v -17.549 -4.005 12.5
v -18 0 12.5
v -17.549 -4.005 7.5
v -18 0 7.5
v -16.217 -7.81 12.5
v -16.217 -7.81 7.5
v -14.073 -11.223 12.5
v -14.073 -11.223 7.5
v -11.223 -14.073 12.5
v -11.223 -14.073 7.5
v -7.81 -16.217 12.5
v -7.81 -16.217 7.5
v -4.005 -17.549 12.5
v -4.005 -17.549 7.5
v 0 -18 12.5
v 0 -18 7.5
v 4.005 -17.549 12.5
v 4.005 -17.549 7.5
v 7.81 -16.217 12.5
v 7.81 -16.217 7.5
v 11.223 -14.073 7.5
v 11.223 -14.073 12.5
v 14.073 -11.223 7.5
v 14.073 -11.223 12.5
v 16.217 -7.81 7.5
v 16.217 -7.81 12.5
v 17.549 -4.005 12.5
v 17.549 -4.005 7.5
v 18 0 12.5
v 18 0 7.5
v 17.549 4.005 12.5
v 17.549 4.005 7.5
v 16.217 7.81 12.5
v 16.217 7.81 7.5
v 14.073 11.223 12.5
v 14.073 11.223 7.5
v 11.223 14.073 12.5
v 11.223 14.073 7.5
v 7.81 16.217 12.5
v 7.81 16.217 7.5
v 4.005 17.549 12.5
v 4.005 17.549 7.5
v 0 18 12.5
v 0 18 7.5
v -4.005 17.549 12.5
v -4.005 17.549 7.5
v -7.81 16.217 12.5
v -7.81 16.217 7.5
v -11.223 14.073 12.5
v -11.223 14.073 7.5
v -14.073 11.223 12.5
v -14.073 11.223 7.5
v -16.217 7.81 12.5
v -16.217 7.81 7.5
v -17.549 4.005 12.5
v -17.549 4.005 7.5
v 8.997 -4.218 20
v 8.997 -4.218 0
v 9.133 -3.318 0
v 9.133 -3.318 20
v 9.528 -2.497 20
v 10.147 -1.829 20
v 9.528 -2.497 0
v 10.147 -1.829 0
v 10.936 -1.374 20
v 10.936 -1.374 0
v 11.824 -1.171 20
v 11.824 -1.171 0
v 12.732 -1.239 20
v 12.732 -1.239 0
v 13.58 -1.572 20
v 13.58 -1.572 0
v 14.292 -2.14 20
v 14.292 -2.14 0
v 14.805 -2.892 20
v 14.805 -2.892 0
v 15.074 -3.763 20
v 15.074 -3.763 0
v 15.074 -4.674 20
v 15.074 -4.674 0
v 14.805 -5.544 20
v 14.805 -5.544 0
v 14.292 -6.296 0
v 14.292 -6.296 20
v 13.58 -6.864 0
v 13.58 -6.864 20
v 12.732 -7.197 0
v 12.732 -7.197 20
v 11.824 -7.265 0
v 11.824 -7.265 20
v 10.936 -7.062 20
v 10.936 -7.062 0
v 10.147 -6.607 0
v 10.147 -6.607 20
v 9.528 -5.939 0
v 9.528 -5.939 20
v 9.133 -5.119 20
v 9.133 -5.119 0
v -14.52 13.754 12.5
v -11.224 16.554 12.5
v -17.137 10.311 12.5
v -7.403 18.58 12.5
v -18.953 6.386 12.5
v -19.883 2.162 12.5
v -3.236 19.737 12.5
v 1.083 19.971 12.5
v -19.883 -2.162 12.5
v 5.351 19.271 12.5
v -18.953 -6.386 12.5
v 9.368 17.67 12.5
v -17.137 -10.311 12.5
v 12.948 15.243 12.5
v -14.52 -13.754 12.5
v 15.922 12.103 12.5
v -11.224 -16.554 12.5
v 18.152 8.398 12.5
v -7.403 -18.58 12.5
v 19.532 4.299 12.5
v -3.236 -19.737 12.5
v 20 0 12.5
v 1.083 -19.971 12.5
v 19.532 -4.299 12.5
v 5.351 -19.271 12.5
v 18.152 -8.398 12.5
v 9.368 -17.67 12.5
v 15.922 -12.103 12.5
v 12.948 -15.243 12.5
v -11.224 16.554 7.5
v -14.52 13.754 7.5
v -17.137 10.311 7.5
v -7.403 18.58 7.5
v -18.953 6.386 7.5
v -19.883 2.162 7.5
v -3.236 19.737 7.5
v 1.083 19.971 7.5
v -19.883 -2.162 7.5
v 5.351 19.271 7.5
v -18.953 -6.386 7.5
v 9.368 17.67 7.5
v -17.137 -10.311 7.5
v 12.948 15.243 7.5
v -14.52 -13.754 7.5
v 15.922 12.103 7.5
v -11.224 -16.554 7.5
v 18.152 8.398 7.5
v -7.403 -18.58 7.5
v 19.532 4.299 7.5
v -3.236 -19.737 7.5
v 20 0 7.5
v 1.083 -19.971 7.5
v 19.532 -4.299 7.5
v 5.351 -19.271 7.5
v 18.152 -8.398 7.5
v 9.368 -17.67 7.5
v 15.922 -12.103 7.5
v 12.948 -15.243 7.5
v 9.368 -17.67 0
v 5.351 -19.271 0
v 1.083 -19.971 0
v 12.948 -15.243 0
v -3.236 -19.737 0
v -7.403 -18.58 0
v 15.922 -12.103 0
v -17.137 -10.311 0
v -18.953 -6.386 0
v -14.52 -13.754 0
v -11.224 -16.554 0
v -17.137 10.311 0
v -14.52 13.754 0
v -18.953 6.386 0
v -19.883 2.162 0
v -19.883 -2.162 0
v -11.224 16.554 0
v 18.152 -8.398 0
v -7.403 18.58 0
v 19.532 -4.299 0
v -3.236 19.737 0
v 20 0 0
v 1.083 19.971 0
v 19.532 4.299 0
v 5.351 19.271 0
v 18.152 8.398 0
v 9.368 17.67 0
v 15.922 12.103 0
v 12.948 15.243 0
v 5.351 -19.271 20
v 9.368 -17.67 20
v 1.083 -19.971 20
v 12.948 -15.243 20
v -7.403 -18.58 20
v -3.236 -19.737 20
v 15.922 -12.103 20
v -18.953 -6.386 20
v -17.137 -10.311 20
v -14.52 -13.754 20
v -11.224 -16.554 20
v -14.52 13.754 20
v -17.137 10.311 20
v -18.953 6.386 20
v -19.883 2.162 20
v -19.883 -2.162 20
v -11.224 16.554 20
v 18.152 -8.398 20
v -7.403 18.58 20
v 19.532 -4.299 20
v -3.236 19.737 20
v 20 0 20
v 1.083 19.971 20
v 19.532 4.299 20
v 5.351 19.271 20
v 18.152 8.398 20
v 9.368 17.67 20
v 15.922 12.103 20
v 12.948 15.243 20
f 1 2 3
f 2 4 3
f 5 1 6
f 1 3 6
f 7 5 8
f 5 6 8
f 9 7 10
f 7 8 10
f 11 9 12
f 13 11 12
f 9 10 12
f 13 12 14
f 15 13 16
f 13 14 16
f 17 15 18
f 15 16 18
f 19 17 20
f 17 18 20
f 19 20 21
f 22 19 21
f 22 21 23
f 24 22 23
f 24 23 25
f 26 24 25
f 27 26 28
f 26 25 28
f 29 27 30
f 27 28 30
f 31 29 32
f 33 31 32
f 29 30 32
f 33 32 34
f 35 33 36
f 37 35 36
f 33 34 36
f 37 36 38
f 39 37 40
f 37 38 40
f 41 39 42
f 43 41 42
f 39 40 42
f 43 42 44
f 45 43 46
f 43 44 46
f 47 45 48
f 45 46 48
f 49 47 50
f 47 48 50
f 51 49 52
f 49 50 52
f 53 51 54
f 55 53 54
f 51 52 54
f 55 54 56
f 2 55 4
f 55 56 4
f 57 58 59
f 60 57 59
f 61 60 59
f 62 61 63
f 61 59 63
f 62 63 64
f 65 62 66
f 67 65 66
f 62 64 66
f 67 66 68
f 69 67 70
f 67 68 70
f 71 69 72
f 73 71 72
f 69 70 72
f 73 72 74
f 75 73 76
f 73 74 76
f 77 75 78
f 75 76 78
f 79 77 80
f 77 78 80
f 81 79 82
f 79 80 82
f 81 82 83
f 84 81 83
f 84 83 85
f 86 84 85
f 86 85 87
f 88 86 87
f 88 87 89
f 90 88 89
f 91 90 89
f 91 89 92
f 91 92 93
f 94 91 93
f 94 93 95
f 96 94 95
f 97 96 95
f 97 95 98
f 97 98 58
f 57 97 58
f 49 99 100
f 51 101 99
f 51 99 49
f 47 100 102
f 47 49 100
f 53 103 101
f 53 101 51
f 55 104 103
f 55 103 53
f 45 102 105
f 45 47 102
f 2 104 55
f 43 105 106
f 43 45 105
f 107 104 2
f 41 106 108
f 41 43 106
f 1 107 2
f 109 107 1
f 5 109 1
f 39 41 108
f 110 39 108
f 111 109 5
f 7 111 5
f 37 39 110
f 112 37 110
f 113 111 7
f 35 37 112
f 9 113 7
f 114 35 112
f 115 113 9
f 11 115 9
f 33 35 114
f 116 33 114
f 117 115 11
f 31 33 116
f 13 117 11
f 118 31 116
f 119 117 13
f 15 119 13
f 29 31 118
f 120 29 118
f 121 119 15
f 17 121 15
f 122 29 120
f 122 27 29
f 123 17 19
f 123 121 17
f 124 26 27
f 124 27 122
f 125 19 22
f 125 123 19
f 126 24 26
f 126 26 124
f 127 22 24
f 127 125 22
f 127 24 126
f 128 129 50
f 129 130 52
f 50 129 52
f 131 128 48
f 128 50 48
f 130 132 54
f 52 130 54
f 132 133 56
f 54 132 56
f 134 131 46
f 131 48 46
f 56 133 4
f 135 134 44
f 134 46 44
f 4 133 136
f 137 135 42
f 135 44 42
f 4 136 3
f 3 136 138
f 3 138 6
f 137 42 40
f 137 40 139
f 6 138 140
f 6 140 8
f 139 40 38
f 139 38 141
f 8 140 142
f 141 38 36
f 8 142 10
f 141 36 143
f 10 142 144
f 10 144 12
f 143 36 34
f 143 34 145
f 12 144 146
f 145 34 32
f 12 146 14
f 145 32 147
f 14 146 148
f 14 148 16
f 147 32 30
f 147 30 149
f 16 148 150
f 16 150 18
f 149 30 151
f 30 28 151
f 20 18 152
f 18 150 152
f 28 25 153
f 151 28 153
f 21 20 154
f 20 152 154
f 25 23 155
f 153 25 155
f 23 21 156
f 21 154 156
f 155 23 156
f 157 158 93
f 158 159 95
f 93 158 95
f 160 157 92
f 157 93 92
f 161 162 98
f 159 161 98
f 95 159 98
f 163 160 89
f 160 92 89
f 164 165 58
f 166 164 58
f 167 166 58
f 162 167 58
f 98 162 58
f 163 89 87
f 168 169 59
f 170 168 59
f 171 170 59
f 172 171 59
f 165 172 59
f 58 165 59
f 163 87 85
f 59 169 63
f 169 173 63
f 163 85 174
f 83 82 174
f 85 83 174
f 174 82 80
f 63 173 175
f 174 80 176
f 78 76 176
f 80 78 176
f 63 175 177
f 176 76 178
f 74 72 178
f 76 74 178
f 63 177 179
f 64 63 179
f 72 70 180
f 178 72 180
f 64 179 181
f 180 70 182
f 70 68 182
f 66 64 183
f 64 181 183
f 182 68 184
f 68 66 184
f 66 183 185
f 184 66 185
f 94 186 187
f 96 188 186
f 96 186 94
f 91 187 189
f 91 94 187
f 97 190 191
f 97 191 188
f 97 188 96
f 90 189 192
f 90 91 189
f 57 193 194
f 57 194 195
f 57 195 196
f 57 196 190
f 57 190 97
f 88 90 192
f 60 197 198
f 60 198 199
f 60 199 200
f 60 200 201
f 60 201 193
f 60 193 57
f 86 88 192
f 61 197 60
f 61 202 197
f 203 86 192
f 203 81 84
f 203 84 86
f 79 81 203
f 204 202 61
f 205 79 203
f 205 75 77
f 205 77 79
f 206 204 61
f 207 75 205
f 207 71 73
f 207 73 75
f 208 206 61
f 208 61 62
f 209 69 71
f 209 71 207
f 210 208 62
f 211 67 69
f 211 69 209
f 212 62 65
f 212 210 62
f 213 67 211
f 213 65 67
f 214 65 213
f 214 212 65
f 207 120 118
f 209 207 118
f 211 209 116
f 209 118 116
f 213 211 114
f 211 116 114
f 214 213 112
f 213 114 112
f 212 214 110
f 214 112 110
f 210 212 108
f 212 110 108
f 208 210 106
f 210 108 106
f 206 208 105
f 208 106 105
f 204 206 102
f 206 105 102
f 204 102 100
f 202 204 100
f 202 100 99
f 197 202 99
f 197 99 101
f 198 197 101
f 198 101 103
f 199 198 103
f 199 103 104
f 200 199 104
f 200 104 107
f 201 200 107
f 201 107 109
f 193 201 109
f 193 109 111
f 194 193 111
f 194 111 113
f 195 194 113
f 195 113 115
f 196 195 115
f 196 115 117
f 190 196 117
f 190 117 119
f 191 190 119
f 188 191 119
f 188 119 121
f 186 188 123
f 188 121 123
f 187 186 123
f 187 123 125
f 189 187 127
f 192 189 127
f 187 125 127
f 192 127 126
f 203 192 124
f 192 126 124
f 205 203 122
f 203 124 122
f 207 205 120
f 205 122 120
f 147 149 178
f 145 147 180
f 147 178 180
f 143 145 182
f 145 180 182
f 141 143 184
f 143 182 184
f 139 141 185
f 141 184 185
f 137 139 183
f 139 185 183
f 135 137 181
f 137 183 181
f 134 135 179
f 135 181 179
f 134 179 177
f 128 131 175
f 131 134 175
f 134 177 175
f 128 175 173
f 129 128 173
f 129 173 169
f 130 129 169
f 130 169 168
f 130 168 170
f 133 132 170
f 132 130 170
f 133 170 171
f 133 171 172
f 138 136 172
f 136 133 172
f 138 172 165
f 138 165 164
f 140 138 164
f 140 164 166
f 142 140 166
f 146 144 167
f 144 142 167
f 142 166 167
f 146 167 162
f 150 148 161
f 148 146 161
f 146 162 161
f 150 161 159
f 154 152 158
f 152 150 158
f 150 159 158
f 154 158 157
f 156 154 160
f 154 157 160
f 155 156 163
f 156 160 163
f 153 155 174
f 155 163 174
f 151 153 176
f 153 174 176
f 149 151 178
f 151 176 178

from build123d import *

# Parameters (mm, degrees)
SKETCH1_R           = 20
BOSS_EXTRUDE1_DEPTH = 20
SKETCH4_W           = 5
SKETCH4_H           = 2.912778991
SKETCH5_R           = 3.055550827
CUT_EXTRUDE2_DEPTH  = 35.641016151


with BuildPart() as part:
    # Sketch1 → Boss-Extrude1 (new body)
    with BuildSketch(Plane.XY):
        Circle(SKETCH1_R)
    extrude(amount=BOSS_EXTRUDE1_DEPTH)

    # Sketch4 → Cut-Revolve1 (revolve, cut)
    with BuildSketch(Plane(origin=(0, 0, 0), x_dir=(0, 0, -1), z_dir=(1, 0, 0)), mode=Mode.PRIVATE) as cut_revolve1_sk:
        with Locations((-10, 19.456389495)):
            Rectangle(SKETCH4_W, SKETCH4_H)
    revolve(cut_revolve1_sk.sketch.rotate(Axis((0, 0, 0), (0, 0, 1)), 90), axis=Axis((0, 0, 0), (0, 0, 1)), mode=Mode.SUBTRACT)

    # Sketch5 → Cut-Extrude2 (cut, through all)
    with BuildSketch(Plane(origin=(0, 0, 0), x_dir=(-1, 0, 0), z_dir=(0, 0, -1))):
        with Locations((-12.052497778, -4.218156491)):
            Circle(SKETCH5_R)
    extrude(amount=-CUT_EXTRUDE2_DEPTH, mode=Mode.SUBTRACT)


solid = part.part
